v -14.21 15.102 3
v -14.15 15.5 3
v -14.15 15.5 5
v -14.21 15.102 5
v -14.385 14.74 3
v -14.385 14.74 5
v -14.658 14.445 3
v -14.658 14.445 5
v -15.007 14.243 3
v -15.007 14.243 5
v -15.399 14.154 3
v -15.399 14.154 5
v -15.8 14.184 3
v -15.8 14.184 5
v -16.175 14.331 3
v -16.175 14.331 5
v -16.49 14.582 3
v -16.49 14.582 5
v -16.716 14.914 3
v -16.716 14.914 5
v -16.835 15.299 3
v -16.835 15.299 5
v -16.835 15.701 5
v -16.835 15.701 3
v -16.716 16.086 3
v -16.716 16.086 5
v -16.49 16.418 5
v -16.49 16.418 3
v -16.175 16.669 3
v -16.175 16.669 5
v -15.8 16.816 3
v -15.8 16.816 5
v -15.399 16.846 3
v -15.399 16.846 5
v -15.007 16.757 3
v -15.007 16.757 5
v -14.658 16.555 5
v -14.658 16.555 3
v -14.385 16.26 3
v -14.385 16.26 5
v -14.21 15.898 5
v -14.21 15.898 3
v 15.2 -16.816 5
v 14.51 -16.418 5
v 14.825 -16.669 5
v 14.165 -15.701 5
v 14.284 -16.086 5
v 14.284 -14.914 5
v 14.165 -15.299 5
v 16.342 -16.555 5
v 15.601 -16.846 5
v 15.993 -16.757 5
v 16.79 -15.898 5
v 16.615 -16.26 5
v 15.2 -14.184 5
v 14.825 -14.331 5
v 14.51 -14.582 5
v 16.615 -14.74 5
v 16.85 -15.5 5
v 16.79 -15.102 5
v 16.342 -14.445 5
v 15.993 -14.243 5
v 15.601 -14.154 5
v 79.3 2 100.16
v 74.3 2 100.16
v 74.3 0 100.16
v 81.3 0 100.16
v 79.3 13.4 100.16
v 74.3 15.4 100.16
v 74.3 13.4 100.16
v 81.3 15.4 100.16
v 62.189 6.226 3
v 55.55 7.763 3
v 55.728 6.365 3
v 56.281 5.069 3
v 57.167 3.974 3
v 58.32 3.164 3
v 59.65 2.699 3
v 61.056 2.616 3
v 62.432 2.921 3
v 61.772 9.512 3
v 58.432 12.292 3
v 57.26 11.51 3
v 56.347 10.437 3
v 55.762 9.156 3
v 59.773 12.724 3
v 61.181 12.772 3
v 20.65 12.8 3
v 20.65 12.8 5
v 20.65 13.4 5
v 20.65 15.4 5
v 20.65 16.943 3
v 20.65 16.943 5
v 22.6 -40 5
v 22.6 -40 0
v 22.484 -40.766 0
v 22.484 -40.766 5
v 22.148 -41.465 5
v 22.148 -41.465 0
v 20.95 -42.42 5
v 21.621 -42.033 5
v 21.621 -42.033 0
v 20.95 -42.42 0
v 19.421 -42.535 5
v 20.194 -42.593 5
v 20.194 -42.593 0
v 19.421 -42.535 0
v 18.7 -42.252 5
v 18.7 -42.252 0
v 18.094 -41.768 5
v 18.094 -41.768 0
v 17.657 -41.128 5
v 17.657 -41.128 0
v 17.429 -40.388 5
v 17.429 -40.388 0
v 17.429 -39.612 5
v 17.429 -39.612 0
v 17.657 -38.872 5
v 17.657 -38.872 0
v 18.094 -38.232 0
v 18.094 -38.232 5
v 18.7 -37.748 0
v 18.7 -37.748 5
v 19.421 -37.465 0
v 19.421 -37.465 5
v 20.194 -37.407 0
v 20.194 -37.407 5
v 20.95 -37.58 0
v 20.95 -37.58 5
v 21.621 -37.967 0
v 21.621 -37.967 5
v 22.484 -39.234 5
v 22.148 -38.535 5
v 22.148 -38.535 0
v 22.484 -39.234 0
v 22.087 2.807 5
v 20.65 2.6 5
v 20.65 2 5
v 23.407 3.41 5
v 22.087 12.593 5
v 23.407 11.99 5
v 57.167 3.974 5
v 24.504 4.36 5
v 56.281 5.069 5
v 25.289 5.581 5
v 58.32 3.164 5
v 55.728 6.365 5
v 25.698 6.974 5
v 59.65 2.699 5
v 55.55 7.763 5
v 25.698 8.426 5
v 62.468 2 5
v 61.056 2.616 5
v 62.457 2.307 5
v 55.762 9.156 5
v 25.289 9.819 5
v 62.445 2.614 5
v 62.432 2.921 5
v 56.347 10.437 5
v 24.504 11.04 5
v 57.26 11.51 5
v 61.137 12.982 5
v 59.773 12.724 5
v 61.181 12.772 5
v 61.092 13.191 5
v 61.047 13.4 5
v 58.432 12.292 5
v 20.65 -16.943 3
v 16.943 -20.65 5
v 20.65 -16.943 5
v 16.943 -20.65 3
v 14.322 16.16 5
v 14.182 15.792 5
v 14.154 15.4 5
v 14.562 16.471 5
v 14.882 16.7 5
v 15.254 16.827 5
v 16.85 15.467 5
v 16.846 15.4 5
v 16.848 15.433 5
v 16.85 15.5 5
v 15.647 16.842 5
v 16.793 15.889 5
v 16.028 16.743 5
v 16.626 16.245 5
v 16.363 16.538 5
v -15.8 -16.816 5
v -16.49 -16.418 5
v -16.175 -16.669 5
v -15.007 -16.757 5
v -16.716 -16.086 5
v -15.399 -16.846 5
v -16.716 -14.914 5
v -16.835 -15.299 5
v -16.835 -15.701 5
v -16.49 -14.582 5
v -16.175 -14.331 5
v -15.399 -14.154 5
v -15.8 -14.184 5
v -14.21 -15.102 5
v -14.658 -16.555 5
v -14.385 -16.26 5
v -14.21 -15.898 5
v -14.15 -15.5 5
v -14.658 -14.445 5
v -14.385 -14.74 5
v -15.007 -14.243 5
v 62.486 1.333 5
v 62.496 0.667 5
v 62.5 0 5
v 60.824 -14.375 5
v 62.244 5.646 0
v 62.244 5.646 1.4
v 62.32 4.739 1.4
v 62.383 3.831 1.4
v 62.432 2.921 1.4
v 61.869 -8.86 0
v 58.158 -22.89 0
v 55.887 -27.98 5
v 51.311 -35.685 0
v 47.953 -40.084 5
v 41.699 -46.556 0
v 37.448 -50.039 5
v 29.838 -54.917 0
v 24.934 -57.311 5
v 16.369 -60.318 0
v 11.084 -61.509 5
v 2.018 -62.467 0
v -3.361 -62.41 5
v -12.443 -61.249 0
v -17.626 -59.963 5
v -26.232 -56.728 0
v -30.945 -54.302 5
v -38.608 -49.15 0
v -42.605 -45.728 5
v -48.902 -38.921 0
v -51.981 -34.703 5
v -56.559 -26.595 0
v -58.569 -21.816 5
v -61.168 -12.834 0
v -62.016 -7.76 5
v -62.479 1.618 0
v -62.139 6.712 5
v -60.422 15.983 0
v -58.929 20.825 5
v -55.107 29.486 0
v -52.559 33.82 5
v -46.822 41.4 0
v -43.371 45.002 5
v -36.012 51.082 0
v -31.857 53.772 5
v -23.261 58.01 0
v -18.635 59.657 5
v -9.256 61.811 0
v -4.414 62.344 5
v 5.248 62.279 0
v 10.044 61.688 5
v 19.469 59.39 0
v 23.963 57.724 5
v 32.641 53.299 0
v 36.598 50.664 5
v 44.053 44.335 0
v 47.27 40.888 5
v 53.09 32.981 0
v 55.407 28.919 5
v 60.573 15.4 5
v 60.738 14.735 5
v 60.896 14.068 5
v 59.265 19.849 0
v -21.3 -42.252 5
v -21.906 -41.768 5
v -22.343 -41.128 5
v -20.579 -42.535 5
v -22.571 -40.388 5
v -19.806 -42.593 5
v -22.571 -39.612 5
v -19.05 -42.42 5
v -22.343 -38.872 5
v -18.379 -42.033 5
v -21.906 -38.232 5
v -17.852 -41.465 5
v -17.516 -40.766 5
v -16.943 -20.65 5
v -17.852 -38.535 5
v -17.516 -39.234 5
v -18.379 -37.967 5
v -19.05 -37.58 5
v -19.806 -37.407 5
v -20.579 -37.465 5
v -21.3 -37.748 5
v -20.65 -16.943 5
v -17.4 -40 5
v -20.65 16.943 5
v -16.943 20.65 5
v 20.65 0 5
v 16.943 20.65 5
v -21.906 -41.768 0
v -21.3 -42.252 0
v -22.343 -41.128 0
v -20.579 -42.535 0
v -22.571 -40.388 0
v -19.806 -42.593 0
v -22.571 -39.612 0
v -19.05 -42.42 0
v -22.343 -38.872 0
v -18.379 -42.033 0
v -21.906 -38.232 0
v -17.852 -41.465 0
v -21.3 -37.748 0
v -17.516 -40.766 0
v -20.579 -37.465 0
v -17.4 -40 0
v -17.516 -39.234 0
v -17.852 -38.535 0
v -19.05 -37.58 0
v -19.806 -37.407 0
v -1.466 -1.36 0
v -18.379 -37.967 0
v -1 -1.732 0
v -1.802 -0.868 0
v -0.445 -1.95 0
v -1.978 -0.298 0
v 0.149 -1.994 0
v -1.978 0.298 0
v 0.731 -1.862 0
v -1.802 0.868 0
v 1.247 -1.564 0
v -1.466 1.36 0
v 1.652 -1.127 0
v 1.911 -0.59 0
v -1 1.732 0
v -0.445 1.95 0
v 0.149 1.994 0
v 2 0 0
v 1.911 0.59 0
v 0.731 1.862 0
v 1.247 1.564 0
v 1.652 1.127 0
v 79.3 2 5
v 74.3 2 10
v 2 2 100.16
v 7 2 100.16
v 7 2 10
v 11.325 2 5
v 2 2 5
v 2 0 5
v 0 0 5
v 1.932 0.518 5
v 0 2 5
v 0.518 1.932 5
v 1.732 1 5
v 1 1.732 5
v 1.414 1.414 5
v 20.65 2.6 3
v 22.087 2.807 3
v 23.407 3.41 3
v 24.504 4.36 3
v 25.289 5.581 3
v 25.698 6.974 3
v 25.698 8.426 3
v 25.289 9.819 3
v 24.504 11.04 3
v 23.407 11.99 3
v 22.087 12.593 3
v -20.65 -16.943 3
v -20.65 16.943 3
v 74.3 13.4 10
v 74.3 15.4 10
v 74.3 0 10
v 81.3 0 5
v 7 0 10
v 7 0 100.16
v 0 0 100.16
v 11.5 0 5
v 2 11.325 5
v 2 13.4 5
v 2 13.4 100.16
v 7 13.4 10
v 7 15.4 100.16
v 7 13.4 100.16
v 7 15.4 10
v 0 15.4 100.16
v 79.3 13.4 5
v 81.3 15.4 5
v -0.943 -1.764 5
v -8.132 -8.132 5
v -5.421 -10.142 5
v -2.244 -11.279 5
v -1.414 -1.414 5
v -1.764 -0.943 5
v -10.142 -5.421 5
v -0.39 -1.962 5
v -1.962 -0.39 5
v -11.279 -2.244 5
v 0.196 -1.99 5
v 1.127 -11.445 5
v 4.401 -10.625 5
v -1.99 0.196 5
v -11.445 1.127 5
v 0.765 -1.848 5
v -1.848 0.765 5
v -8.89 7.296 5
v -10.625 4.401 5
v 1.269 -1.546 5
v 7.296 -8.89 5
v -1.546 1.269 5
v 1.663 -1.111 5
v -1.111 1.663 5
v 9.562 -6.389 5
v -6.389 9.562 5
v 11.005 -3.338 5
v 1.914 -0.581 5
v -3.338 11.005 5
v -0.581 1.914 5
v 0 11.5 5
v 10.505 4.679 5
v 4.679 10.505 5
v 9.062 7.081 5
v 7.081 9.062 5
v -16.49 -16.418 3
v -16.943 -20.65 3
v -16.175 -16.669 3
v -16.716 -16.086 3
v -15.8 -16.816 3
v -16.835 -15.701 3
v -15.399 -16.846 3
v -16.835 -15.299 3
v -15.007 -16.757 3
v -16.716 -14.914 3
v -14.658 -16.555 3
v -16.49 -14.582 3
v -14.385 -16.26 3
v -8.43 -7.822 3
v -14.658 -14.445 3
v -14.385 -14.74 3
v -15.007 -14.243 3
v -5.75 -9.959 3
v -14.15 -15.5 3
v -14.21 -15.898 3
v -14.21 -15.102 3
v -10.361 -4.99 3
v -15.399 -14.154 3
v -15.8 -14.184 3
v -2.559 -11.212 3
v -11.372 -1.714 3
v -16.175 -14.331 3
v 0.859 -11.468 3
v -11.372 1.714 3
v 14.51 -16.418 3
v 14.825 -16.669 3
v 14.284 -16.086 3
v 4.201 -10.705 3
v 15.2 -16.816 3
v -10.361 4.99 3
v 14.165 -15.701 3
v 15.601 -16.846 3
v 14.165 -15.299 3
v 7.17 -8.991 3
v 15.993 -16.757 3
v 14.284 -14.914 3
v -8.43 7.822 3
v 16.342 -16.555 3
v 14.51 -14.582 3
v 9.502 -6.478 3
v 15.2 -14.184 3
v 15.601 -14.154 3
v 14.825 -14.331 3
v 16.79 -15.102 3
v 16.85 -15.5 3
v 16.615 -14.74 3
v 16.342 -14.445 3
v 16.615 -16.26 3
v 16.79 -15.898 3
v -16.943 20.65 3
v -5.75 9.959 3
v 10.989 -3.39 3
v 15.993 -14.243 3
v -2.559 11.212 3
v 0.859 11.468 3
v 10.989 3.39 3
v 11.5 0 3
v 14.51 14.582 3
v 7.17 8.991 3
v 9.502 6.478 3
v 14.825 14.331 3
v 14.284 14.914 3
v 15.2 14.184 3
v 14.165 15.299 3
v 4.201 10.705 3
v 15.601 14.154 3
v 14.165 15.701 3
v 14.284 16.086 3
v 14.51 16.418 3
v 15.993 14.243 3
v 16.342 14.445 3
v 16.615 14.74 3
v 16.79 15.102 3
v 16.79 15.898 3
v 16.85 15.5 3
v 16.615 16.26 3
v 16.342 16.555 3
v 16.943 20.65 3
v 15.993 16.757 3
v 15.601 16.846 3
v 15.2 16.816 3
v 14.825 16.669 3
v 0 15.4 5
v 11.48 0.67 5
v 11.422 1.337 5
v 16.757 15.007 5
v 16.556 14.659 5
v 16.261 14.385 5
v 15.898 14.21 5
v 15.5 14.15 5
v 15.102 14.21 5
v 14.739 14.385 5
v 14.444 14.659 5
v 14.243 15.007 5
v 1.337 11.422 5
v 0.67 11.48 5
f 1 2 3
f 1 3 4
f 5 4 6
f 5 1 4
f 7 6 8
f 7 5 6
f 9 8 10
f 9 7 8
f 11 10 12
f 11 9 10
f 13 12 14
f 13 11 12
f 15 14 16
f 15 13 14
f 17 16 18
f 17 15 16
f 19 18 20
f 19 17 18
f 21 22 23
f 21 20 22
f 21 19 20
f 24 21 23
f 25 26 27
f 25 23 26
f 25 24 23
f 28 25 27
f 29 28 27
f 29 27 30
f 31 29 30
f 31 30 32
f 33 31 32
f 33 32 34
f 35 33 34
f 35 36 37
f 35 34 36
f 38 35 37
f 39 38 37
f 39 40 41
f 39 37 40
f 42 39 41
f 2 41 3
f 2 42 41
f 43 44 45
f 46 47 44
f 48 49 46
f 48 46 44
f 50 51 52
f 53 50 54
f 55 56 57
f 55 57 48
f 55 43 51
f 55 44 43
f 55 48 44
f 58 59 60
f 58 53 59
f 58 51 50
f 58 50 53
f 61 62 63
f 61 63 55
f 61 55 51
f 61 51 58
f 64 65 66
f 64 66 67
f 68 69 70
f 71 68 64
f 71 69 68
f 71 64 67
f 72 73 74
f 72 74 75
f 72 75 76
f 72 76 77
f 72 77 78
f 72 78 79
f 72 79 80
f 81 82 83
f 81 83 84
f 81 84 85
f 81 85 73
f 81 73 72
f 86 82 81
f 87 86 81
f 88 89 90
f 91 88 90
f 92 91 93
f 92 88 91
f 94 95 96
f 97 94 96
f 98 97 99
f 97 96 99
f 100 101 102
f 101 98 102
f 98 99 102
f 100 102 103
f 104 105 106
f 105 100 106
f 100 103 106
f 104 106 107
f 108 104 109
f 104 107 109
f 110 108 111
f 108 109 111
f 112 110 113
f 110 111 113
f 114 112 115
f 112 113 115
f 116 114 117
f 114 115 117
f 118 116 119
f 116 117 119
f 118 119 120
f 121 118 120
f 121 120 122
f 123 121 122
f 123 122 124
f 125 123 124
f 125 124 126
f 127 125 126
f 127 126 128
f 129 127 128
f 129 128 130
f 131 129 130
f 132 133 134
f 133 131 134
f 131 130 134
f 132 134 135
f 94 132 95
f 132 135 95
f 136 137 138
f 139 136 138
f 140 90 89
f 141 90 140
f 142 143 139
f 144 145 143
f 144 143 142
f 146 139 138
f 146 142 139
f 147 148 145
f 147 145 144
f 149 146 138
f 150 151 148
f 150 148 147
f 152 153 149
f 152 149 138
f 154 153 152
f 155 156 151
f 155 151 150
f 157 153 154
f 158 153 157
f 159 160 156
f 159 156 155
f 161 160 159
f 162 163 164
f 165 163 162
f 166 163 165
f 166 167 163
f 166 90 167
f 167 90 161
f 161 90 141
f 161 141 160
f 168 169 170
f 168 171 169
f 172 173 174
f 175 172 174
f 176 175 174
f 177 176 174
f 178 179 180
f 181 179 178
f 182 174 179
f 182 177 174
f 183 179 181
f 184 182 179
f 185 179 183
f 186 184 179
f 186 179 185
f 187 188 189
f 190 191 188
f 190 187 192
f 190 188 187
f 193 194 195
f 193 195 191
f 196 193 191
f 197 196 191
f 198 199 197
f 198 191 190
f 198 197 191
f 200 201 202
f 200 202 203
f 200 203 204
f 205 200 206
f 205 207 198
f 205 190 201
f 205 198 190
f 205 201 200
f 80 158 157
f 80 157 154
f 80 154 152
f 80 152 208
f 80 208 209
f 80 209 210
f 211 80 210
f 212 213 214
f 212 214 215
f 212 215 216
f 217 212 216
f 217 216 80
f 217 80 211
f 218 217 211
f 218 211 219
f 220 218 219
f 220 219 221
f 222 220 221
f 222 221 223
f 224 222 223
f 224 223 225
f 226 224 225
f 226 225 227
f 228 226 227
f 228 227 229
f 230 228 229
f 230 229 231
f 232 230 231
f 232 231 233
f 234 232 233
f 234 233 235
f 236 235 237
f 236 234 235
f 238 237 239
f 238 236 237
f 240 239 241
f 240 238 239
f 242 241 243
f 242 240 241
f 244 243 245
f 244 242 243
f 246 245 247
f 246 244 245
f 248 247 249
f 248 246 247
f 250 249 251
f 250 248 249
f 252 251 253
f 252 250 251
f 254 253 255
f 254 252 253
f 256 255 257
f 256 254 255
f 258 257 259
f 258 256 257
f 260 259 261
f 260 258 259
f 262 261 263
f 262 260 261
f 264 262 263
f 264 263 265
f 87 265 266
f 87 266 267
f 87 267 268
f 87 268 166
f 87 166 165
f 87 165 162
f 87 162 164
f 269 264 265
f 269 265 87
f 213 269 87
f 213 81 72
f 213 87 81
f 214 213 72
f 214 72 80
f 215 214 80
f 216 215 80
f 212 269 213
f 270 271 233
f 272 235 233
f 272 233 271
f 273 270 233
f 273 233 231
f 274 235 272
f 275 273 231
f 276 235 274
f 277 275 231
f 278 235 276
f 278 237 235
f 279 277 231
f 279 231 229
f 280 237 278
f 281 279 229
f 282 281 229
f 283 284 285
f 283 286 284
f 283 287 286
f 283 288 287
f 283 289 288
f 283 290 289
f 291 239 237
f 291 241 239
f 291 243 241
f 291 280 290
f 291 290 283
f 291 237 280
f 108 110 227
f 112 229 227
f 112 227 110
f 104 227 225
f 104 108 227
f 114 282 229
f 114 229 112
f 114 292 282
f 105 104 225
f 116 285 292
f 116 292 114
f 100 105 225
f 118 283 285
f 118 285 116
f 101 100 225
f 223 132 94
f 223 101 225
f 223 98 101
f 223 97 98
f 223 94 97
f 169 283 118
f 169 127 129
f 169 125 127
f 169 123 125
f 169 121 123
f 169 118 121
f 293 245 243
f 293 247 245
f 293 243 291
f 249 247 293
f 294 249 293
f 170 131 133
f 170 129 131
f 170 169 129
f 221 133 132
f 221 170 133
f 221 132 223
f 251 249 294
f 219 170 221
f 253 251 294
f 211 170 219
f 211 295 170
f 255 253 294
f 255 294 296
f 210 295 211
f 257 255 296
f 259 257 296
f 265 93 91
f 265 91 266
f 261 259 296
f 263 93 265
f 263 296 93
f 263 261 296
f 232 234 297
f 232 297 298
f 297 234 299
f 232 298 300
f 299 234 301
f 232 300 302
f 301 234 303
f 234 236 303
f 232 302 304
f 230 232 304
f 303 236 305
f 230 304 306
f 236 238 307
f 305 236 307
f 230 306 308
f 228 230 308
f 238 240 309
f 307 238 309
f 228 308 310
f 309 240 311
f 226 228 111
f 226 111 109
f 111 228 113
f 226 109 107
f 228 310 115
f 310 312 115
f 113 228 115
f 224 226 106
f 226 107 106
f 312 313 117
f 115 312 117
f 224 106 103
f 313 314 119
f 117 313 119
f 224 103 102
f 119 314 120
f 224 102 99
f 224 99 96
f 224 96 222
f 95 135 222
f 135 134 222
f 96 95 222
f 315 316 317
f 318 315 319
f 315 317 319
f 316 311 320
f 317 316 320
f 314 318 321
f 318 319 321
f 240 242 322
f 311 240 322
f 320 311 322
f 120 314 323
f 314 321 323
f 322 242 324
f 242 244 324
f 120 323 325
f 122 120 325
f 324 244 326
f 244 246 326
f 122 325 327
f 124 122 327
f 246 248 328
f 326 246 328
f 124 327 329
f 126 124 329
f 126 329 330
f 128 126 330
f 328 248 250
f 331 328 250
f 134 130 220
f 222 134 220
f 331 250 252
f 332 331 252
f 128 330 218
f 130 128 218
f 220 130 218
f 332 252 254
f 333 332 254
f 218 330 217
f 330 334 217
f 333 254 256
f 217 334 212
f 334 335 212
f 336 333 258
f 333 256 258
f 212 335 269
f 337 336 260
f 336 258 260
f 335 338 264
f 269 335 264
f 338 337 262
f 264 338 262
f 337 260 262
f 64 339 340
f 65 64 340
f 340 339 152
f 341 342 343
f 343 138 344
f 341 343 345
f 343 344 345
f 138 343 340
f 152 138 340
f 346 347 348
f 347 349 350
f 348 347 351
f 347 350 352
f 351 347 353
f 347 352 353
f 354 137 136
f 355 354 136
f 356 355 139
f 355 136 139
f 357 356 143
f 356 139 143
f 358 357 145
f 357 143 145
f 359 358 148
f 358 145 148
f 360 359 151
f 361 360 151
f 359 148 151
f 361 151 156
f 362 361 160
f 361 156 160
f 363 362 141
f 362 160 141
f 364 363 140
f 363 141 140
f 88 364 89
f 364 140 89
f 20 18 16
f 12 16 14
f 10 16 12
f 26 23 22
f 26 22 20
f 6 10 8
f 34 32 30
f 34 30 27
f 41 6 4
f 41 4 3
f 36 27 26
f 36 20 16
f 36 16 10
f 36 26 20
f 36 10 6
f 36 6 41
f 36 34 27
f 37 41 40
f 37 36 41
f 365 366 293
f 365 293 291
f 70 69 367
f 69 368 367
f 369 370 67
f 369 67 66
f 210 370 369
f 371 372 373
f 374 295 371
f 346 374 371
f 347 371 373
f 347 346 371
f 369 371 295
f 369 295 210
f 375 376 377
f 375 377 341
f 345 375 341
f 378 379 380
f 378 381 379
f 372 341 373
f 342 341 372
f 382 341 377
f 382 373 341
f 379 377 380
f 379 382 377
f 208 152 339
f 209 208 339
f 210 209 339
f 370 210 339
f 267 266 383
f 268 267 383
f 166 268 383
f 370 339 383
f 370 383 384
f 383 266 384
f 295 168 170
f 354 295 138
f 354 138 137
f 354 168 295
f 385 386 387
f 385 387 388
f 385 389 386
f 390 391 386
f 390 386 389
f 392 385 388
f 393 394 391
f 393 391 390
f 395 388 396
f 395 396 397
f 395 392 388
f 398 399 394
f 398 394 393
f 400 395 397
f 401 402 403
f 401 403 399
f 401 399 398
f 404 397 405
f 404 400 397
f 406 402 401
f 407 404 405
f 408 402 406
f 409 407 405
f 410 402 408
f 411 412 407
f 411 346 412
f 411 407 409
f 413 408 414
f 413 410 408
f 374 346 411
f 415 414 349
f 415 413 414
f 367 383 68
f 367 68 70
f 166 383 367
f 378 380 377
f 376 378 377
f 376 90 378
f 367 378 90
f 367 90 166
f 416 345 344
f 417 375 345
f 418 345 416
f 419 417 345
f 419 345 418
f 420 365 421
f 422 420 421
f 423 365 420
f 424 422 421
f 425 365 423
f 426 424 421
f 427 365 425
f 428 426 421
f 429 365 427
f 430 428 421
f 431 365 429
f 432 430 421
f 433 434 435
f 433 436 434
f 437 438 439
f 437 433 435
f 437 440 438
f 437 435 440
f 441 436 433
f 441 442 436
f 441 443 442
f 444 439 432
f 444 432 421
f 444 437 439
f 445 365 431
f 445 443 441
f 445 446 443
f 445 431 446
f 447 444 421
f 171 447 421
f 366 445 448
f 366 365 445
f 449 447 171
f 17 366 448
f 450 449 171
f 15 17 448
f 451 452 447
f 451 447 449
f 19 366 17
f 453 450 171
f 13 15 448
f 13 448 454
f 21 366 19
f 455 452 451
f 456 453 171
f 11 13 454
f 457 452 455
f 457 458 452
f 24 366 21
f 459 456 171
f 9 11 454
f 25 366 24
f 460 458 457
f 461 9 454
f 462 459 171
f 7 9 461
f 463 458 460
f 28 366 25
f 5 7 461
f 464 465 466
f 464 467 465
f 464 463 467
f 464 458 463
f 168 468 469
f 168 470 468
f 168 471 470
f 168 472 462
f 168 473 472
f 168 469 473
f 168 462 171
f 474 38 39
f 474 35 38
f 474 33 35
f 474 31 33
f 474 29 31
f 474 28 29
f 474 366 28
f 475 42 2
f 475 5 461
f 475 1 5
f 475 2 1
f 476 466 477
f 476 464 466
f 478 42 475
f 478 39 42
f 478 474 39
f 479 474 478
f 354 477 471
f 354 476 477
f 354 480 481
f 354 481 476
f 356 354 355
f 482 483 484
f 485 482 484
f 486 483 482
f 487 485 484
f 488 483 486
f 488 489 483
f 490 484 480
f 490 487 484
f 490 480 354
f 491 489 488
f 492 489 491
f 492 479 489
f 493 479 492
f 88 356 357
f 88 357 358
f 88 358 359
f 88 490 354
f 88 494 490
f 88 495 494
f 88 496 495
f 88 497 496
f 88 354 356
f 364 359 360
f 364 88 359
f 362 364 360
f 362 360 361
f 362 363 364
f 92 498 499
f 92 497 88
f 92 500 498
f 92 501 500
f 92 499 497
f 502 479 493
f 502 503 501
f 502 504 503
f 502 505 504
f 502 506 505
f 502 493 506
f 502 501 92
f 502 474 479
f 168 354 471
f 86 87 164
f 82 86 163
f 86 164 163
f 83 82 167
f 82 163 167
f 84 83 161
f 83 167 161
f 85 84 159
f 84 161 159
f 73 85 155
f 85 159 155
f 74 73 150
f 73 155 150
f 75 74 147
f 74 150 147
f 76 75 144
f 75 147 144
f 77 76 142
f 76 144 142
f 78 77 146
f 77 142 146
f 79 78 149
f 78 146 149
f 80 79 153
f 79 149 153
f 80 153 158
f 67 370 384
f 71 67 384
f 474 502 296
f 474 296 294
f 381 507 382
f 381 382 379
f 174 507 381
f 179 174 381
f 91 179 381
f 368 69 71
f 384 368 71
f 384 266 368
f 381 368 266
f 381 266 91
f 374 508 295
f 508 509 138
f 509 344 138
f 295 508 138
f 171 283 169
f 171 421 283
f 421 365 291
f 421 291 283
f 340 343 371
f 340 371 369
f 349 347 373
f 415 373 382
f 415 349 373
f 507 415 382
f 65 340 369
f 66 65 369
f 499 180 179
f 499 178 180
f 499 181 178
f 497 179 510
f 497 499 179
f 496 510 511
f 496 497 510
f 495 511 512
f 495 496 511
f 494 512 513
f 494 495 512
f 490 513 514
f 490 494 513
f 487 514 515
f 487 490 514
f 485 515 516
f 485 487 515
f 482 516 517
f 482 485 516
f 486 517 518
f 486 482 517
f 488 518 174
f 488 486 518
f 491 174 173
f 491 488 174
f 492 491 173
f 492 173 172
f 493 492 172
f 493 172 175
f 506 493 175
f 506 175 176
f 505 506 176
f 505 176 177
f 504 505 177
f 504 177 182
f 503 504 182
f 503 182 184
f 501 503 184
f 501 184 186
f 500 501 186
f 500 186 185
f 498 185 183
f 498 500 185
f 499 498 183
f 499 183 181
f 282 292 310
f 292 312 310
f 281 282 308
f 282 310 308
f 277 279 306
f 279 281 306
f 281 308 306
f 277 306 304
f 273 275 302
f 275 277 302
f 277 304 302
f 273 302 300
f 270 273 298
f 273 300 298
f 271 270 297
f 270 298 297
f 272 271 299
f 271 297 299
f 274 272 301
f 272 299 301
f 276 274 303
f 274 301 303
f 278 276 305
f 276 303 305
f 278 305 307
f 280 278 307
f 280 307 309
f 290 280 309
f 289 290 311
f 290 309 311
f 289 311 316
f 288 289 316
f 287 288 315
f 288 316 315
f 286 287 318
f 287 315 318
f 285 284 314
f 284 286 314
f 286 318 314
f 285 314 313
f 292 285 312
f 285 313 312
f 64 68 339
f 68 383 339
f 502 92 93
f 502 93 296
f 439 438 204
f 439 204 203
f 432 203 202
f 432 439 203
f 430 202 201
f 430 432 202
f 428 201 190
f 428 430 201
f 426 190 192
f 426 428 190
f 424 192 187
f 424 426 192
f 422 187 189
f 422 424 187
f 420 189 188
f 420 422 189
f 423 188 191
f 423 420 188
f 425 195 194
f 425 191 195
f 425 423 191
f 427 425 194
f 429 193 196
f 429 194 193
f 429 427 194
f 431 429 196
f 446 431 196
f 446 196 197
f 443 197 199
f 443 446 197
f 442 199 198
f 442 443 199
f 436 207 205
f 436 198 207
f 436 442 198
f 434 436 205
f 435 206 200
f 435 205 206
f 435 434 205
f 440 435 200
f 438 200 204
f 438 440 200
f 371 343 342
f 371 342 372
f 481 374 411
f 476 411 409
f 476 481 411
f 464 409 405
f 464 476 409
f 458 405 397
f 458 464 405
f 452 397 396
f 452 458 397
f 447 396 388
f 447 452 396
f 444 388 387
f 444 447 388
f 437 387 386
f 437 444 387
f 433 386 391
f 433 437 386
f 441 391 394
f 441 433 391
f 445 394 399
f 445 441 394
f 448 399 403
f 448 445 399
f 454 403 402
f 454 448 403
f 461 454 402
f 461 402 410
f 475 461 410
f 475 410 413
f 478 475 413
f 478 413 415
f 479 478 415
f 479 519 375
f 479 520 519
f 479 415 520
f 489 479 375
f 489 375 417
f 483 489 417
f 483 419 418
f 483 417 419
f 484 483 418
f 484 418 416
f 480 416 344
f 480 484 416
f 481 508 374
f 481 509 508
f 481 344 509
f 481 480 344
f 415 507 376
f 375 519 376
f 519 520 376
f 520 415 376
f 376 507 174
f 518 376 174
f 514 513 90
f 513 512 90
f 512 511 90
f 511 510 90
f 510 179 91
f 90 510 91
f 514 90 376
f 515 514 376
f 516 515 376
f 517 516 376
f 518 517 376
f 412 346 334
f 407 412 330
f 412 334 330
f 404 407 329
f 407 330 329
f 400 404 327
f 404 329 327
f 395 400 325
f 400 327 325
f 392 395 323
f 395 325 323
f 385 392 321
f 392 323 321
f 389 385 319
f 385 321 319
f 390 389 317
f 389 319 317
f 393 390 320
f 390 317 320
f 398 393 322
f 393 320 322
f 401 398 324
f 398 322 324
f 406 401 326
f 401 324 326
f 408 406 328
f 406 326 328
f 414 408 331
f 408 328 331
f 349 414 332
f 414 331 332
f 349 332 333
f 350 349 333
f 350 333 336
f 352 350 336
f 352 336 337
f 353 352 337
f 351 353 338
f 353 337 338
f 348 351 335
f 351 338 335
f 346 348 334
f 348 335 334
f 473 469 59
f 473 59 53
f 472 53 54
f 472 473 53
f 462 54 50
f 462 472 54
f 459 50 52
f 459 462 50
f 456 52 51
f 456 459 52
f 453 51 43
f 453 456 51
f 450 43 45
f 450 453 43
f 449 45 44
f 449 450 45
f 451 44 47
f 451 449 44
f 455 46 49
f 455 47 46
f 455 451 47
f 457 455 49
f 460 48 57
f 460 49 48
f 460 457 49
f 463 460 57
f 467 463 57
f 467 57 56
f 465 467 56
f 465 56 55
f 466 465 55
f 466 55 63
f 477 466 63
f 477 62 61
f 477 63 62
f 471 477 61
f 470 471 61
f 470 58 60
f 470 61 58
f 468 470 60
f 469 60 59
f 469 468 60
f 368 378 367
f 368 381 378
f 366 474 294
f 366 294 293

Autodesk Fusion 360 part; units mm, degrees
sketch "Sketch1" plane through (0, 0, 0) normal (0, 0, 1) x (1, 0, 0)
  line L0 (0, 0) -> (81.3, 0)
  line L1 (81.3, 0) -> (81.3, 15.4)
  line L2 (81.3, 15.4) -> (0, 15.4)
  line L3 (0, 15.4) -> (0, 0)
  dimension "d8" = 81.3
  dimension "d9" = 15.4
extrude "Extrude1" add sketch "Sketch1" along normal blind 5
sketch "Sketch2" plane through (0, 0, 5) normal (0, 0, 1) x (-1, 0, 0)
  line L0 (0, -15.4) -> (0, 0)
  line L1 (0, 0) -> (-81.3, 0)
  line L2 (-81.3, 0) -> (-81.3, -15.4)
  line L3 (-81.3, -15.4) -> (0, -15.4)
  circle A0 centre (-20.65, -7.7) radius 2.6
  circle A1 centre (-20.65, -7.7) radius 5.1
  line L4 (-40.65, -15.4) -> (-40.65, -7.6842) construction
  line L5 (-40.65, -7.7) -> (-81.3, -7.7) construction
  circle A2 centre (-60.65, -7.7) radius 5.1
  circle A3 centre (-60.65, -7.7) radius 2.6
  dimension "d16" = 5.2
  dimension "d18" = 7.7
  dimension "d19" = 10.2
  dimension "d34" = 20
extrude "Extrude2" cut sketch "Sketch2" against normal blind 5 contours A0 | A3
extrude "Extrude3" cut sketch "Sketch2" against normal blind 3.6 contours A1 | A2
sketch "Sketch3" plane through (0, 0, 5) normal (0, 0, 1) x (1, 0, 0)
  line L0 (40.65, 14.9854) -> (40.65, -0.0146) construction
  line L1 (0, 15.4) -> (0, 0) construction
  line L2 (74.3, 15.4) -> (74.3, 13.4)
  line L3 (74.3, 13.4) -> (79.3, 13.4)
  line L4 (79.3, 13.4) -> (79.3, 2)
  line L5 (79.3, 2) -> (74.3, 2)
  line L6 (74.3, 2) -> (74.3, 0)
  line L7 (74.3, 0) -> (81.3, 0)
  line L8 (81.3, 0) -> (81.3, 15.4)
  line L9 (81.3, 15.4) -> (74.3, 15.4)
  line L10 (0, 0) -> (0, 15.4)
  line L11 (2, 13.4) -> (2, 2)
  line L12 (2, 2) -> (7, 2)
  line L13 (7, 13.4) -> (2, 13.4)
  line L14 (7, 0) -> (0, 0)
  line L15 (7, 15.4) -> (7, 13.4)
  line L16 (0, 15.4) -> (7, 15.4)
  line L17 (7, 2) -> (7, 0)
  line L18 (7, 15.4) -> (74.3, 15.4)
  line L19 (74.3, 15.4) -> (74.3, 13.4)
  line L20 (74.3, 13.4) -> (7, 13.4)
  line L21 (7, 13.4) -> (7, 15.4)
  line L22 (74.3, 2) -> (7, 2)
  line L23 (7, 2) -> (7, 0)
  line L24 (7, 0) -> (74.3, 0)
  line L25 (74.3, 0) -> (74.3, 2)
  point P0 (81.3, 0)
  dimension "d24" = 40.65
  dimension "d25" = 2
  dimension "d26" = 15.4
  dimension "d27" = 2
  dimension "d29" = 5
extrude "Extrude4" add sketch "Sketch3" along normal blind 95.16 contours L2 L3 L4 L5 L6 L7 L8 L9 L19 L25 | L10 L11 L12 L13 L14 L15 L16 L17 L21 L23
extrude "Extrude5" add sketch "Sketch3" along normal blind 5 contours L2 L15 L18 L19 L20 L21 | L6 L17 L22 L23 L24 L25
equation "pw = 74.8 mm"
equation "pd = 8.9 mm"
equation "ph = 158.6 mm"
equation "clearance = 1.25 mm"
equation "wall_thick = 2 mm"
equation "outer_w = 2 * clearance + 2 * wall_thick + pw"
equation "outer_d = 2 * clearance + 2 * wall_thick + pd"
equation "d8 = outer_w"
equation "d9 = outer_d"
equation "d18 = outer_d / 2"
equation "d24 = outer_w / 2"
equation "d25 = wall_thick"
equation "d26 = outer_d"
equation "d27 = wall_thick"
equation "d30 = ph * 0.6"

Autodesk Fusion 360 part; units mm, degrees
sketch "Sketch1" plane through (0, 0, 0) normal (0, 0, 1) x (1, 0, 0)
  circle A0 centre (0, 0) radius 62.5
  line L0 (-16.9429, 20.65) -> (-20.65, 16.9429)
  line L1 (-20.65, -16.9429) -> (-16.9429, -20.65)
  line L2 (-16.9429, -20.65) -> (16.9429, -20.65)
  line L3 (16.9429, 20.65) -> (-16.9429, 20.65)
  line L4 (-20.65, 16.9429) -> (-20.65, -16.9429)
  line L5 (20.65, 16.9429) -> (16.9429, 20.65)
  line L6 (16.9429, -20.65) -> (20.65, -16.9429)
  line L7 (20.65, -16.9429) -> (20.65, 16.9429)
  circle A1 centre (0, 0) radius 11.5
  circle A2 centre (-15.5, 15.5) radius 1.35
  circle A3 centre (0, 0) radius 2
  circle A4 centre (0, 0) radius 20.65 construction
  line L8 (0, 0) -> (0, 20.65) construction
  line L9 (0, 0) -> (20.65, 0) construction
  circle A5 centre (15.5, 15.5) radius 1.35
  circle A6 centre (-15.5, -15.5) radius 1.35
  circle A7 centre (15.5, -15.5) radius 1.35
  circle A8 centre (-20, -40) radius 2.6
  circle A9 centre (20, -40) radius 2.6
  dimension "d1" = 125
  dimension "d2" = 23
  dimension "d3" = 2.7
  dimension "d4" = 15.5
  dimension "d5" = 15.5
  dimension "d8" = 5.2
  dimension "d9" = 40
  dimension "d10" = 20
extrude "Extrude1" add sketch "Sketch1" along normal blind 3 contours A0 | L0 L1 L2 L3 L4 L5 L6 L7
